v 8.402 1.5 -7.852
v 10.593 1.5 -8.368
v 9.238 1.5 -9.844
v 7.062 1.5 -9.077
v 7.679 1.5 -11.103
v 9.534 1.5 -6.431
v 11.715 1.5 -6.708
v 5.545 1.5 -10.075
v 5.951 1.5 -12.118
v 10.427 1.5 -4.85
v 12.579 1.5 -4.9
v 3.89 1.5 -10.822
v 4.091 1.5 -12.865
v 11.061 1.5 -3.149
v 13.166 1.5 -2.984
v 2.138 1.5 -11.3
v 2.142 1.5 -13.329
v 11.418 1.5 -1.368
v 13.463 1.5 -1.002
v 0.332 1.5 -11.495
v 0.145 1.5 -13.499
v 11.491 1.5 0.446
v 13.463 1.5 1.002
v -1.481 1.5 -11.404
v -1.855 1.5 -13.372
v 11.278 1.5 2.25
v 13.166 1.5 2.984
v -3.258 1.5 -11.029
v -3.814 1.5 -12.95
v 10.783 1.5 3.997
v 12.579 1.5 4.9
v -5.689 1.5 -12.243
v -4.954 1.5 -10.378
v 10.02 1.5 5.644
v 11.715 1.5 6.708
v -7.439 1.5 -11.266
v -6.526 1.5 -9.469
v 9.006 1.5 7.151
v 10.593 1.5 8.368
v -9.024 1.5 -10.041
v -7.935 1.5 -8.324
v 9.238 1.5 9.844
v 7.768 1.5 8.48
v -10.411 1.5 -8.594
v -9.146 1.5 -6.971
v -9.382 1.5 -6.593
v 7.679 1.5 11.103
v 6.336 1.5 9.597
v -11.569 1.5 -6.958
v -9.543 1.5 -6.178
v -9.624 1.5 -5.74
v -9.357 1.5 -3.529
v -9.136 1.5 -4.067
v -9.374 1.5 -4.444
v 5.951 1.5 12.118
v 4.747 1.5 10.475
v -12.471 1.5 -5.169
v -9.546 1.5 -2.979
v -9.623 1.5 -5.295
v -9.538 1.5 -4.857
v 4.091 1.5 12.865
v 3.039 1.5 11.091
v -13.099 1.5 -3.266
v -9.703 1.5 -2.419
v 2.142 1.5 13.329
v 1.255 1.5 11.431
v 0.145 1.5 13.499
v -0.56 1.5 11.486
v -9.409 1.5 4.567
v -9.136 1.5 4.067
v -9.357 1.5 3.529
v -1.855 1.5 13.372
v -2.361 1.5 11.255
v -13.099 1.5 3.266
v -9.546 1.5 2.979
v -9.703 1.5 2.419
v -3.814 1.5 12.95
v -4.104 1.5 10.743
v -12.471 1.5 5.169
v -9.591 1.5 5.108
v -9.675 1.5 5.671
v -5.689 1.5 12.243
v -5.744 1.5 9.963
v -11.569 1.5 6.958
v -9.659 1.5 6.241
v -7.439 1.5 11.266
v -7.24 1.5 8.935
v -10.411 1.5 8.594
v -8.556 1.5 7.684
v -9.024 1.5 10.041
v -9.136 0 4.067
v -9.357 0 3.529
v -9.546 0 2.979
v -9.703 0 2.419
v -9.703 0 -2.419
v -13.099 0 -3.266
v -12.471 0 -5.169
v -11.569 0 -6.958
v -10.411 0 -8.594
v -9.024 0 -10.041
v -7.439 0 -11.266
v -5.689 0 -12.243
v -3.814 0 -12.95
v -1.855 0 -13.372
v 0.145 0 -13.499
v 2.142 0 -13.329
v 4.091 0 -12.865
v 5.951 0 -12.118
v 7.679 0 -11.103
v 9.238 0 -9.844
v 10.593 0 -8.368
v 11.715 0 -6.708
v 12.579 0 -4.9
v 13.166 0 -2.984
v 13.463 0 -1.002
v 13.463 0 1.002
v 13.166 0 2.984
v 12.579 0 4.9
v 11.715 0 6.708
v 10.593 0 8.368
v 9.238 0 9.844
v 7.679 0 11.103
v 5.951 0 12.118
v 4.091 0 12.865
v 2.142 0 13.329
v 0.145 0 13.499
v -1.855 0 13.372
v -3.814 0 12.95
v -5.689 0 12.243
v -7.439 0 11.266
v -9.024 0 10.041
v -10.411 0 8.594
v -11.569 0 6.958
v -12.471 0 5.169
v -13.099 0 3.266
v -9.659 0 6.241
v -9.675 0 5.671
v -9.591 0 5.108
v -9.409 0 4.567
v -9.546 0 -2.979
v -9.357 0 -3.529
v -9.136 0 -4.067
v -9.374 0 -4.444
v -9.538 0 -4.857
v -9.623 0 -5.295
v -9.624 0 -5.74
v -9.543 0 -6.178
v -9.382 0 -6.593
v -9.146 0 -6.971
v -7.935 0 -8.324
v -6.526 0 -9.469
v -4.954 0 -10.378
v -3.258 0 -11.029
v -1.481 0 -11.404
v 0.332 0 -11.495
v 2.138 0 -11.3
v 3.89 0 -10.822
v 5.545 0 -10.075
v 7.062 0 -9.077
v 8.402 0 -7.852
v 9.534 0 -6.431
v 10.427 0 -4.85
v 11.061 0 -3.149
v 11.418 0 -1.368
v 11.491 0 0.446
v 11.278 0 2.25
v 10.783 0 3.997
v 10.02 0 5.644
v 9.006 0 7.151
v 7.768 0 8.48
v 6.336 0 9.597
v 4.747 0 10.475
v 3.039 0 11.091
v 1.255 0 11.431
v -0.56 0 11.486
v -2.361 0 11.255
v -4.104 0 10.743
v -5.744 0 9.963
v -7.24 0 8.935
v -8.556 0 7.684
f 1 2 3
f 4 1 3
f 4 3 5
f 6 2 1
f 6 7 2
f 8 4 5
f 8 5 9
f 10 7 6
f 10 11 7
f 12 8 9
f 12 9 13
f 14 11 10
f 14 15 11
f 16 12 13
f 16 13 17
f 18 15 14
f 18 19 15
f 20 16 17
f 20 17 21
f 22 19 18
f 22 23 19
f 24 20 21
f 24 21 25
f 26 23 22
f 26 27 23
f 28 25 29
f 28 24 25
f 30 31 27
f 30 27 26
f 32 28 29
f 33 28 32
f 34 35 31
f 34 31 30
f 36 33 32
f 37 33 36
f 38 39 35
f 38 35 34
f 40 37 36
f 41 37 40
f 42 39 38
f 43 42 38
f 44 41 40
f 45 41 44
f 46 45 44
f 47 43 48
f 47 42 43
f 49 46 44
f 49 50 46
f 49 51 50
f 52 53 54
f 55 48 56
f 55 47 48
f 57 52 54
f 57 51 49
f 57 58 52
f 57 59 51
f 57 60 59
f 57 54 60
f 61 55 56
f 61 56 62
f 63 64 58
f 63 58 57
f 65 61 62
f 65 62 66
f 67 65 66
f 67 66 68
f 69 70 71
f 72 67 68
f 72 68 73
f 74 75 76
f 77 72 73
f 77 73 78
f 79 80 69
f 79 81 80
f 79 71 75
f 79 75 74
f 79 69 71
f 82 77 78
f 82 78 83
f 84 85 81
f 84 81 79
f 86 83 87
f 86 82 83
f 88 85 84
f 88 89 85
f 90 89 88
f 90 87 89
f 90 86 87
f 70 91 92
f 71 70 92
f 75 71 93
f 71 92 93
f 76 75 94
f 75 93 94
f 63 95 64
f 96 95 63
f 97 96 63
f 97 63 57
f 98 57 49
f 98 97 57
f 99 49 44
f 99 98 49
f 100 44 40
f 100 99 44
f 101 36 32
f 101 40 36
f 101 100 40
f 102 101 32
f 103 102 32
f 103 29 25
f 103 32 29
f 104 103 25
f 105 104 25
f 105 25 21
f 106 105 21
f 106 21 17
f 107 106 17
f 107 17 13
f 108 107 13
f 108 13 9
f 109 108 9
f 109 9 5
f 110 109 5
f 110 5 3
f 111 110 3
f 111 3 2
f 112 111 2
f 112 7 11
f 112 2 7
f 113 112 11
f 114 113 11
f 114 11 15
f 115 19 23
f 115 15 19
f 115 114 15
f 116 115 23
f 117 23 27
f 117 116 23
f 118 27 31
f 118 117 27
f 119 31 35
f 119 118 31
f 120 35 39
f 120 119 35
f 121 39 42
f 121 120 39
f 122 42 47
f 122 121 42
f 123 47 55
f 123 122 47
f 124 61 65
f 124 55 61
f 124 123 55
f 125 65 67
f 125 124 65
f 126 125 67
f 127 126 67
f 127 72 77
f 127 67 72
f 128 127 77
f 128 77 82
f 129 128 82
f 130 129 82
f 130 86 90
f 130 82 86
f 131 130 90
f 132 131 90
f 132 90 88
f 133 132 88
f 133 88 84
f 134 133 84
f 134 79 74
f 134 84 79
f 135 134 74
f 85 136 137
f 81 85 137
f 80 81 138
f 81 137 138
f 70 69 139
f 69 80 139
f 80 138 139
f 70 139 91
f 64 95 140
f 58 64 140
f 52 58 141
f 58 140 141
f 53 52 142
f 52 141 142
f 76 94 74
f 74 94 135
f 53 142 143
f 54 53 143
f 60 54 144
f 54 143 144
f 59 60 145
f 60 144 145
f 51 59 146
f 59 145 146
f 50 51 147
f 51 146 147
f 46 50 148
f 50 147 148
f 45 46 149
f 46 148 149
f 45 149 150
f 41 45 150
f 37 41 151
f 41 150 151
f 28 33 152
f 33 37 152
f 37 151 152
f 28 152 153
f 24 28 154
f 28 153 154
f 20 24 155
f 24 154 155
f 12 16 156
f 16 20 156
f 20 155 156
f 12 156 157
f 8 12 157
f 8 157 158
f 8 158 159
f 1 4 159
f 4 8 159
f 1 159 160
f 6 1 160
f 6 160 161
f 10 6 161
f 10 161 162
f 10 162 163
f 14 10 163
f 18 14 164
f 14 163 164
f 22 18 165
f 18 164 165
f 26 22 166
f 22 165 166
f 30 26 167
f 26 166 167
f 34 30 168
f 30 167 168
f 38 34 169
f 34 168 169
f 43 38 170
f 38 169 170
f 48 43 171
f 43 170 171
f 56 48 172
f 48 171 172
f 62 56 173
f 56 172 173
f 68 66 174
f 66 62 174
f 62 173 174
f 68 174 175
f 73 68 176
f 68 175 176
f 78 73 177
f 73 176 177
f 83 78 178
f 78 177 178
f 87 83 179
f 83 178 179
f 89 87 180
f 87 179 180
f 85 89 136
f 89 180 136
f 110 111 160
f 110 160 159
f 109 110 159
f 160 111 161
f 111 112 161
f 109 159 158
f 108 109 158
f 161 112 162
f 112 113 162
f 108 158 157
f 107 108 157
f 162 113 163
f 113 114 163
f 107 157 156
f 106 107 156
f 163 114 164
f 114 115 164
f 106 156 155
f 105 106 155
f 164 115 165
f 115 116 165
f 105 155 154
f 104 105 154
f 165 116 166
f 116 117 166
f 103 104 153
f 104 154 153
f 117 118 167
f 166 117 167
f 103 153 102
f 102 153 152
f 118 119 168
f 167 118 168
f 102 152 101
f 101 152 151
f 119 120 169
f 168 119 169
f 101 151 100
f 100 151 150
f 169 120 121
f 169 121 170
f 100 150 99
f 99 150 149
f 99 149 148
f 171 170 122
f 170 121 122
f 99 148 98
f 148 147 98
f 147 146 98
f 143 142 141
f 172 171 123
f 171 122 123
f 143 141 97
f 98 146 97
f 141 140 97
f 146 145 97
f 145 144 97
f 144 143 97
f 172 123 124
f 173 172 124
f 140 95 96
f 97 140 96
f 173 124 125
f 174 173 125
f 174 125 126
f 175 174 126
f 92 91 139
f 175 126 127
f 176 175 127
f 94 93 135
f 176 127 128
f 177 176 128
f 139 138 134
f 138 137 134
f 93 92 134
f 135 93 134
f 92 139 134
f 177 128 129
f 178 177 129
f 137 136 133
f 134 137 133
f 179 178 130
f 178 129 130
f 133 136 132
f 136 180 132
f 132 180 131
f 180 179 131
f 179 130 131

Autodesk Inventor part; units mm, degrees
ref_plane "YZ Plane" through (0, 0, 0) normal (1, 0, 0) x (0, 1, 0)
ref_plane "XZ Plane" through (0, 0, 0) normal (0, 1, 0) x (-1, 0, 0)
ref_plane "XY Plane" through (0, 0, 0) normal (0, 0, 1) x (1, 0, 0)
sketch "Sketch1" plane through (0, 0, 0) normal (0, 1, 0) x (-1, 0, 0)
  circle A0 centre (0, 0) radius 13.5
  circle A1 centre (0, 0) radius 11.5
  line L0 (0, 0) -> (13.099, 3.2659)
  line L1 (0, 0) -> (13.099, -3.2659)
  line L2 (0, 0) -> (13.5, 0)
  circle A2 centre (0, 0) radius 10 construction
  line L3 (0, 0) -> (10.5058, 4.6775)
  line L4 (0, 0) -> (10.5058, -4.6775)
  arc A3 (9.703, 2.4192) -> (9.1355, 4.0674) centre (0, 0) ccw
  arc A4 (9.1355, -4.0674) -> (9.703, -2.4192) centre (0, 0) ccw
  arc A5 (9.1355, 4.0674) -> (9.6593, 6.2409) centre (6.4382, 5.8673) ccw
  arc A6 (9.1462, -6.9711) -> (9.1355, -4.0674) centre (7.2505, -5.5263) ccw
  circle A7 centre (11.3253, 3.4202) radius 0.5578
  circle A8 centre (11.3253, -3.4202) radius 0.5578
  point P0 (11.1584, 2.7821)
  point P1 (11.1584, -2.7821)
  dimension "d0" = 27
  dimension "d1" = 23
  dimension "d2" = 14
  dimension "d3" = 14
  dimension "d4" = 20
  dimension "d5" = 10
  dimension "d6" = 10
extrude "Extrusion1" add sketch "Sketch1" along normal blind 1.5 contours L0 A1 A7 A8 L1 A0 | L0 A3 L3 A1 A7 | A1 A8 L4 A4 L1 | A7 A1 | A1 A7 | A8 A1 | A1 A8 | A5 A1 L3 | L4 A1 A6
properties part number "20_Cube_Insert_Beamsplittercube_Retainring_25mm"
